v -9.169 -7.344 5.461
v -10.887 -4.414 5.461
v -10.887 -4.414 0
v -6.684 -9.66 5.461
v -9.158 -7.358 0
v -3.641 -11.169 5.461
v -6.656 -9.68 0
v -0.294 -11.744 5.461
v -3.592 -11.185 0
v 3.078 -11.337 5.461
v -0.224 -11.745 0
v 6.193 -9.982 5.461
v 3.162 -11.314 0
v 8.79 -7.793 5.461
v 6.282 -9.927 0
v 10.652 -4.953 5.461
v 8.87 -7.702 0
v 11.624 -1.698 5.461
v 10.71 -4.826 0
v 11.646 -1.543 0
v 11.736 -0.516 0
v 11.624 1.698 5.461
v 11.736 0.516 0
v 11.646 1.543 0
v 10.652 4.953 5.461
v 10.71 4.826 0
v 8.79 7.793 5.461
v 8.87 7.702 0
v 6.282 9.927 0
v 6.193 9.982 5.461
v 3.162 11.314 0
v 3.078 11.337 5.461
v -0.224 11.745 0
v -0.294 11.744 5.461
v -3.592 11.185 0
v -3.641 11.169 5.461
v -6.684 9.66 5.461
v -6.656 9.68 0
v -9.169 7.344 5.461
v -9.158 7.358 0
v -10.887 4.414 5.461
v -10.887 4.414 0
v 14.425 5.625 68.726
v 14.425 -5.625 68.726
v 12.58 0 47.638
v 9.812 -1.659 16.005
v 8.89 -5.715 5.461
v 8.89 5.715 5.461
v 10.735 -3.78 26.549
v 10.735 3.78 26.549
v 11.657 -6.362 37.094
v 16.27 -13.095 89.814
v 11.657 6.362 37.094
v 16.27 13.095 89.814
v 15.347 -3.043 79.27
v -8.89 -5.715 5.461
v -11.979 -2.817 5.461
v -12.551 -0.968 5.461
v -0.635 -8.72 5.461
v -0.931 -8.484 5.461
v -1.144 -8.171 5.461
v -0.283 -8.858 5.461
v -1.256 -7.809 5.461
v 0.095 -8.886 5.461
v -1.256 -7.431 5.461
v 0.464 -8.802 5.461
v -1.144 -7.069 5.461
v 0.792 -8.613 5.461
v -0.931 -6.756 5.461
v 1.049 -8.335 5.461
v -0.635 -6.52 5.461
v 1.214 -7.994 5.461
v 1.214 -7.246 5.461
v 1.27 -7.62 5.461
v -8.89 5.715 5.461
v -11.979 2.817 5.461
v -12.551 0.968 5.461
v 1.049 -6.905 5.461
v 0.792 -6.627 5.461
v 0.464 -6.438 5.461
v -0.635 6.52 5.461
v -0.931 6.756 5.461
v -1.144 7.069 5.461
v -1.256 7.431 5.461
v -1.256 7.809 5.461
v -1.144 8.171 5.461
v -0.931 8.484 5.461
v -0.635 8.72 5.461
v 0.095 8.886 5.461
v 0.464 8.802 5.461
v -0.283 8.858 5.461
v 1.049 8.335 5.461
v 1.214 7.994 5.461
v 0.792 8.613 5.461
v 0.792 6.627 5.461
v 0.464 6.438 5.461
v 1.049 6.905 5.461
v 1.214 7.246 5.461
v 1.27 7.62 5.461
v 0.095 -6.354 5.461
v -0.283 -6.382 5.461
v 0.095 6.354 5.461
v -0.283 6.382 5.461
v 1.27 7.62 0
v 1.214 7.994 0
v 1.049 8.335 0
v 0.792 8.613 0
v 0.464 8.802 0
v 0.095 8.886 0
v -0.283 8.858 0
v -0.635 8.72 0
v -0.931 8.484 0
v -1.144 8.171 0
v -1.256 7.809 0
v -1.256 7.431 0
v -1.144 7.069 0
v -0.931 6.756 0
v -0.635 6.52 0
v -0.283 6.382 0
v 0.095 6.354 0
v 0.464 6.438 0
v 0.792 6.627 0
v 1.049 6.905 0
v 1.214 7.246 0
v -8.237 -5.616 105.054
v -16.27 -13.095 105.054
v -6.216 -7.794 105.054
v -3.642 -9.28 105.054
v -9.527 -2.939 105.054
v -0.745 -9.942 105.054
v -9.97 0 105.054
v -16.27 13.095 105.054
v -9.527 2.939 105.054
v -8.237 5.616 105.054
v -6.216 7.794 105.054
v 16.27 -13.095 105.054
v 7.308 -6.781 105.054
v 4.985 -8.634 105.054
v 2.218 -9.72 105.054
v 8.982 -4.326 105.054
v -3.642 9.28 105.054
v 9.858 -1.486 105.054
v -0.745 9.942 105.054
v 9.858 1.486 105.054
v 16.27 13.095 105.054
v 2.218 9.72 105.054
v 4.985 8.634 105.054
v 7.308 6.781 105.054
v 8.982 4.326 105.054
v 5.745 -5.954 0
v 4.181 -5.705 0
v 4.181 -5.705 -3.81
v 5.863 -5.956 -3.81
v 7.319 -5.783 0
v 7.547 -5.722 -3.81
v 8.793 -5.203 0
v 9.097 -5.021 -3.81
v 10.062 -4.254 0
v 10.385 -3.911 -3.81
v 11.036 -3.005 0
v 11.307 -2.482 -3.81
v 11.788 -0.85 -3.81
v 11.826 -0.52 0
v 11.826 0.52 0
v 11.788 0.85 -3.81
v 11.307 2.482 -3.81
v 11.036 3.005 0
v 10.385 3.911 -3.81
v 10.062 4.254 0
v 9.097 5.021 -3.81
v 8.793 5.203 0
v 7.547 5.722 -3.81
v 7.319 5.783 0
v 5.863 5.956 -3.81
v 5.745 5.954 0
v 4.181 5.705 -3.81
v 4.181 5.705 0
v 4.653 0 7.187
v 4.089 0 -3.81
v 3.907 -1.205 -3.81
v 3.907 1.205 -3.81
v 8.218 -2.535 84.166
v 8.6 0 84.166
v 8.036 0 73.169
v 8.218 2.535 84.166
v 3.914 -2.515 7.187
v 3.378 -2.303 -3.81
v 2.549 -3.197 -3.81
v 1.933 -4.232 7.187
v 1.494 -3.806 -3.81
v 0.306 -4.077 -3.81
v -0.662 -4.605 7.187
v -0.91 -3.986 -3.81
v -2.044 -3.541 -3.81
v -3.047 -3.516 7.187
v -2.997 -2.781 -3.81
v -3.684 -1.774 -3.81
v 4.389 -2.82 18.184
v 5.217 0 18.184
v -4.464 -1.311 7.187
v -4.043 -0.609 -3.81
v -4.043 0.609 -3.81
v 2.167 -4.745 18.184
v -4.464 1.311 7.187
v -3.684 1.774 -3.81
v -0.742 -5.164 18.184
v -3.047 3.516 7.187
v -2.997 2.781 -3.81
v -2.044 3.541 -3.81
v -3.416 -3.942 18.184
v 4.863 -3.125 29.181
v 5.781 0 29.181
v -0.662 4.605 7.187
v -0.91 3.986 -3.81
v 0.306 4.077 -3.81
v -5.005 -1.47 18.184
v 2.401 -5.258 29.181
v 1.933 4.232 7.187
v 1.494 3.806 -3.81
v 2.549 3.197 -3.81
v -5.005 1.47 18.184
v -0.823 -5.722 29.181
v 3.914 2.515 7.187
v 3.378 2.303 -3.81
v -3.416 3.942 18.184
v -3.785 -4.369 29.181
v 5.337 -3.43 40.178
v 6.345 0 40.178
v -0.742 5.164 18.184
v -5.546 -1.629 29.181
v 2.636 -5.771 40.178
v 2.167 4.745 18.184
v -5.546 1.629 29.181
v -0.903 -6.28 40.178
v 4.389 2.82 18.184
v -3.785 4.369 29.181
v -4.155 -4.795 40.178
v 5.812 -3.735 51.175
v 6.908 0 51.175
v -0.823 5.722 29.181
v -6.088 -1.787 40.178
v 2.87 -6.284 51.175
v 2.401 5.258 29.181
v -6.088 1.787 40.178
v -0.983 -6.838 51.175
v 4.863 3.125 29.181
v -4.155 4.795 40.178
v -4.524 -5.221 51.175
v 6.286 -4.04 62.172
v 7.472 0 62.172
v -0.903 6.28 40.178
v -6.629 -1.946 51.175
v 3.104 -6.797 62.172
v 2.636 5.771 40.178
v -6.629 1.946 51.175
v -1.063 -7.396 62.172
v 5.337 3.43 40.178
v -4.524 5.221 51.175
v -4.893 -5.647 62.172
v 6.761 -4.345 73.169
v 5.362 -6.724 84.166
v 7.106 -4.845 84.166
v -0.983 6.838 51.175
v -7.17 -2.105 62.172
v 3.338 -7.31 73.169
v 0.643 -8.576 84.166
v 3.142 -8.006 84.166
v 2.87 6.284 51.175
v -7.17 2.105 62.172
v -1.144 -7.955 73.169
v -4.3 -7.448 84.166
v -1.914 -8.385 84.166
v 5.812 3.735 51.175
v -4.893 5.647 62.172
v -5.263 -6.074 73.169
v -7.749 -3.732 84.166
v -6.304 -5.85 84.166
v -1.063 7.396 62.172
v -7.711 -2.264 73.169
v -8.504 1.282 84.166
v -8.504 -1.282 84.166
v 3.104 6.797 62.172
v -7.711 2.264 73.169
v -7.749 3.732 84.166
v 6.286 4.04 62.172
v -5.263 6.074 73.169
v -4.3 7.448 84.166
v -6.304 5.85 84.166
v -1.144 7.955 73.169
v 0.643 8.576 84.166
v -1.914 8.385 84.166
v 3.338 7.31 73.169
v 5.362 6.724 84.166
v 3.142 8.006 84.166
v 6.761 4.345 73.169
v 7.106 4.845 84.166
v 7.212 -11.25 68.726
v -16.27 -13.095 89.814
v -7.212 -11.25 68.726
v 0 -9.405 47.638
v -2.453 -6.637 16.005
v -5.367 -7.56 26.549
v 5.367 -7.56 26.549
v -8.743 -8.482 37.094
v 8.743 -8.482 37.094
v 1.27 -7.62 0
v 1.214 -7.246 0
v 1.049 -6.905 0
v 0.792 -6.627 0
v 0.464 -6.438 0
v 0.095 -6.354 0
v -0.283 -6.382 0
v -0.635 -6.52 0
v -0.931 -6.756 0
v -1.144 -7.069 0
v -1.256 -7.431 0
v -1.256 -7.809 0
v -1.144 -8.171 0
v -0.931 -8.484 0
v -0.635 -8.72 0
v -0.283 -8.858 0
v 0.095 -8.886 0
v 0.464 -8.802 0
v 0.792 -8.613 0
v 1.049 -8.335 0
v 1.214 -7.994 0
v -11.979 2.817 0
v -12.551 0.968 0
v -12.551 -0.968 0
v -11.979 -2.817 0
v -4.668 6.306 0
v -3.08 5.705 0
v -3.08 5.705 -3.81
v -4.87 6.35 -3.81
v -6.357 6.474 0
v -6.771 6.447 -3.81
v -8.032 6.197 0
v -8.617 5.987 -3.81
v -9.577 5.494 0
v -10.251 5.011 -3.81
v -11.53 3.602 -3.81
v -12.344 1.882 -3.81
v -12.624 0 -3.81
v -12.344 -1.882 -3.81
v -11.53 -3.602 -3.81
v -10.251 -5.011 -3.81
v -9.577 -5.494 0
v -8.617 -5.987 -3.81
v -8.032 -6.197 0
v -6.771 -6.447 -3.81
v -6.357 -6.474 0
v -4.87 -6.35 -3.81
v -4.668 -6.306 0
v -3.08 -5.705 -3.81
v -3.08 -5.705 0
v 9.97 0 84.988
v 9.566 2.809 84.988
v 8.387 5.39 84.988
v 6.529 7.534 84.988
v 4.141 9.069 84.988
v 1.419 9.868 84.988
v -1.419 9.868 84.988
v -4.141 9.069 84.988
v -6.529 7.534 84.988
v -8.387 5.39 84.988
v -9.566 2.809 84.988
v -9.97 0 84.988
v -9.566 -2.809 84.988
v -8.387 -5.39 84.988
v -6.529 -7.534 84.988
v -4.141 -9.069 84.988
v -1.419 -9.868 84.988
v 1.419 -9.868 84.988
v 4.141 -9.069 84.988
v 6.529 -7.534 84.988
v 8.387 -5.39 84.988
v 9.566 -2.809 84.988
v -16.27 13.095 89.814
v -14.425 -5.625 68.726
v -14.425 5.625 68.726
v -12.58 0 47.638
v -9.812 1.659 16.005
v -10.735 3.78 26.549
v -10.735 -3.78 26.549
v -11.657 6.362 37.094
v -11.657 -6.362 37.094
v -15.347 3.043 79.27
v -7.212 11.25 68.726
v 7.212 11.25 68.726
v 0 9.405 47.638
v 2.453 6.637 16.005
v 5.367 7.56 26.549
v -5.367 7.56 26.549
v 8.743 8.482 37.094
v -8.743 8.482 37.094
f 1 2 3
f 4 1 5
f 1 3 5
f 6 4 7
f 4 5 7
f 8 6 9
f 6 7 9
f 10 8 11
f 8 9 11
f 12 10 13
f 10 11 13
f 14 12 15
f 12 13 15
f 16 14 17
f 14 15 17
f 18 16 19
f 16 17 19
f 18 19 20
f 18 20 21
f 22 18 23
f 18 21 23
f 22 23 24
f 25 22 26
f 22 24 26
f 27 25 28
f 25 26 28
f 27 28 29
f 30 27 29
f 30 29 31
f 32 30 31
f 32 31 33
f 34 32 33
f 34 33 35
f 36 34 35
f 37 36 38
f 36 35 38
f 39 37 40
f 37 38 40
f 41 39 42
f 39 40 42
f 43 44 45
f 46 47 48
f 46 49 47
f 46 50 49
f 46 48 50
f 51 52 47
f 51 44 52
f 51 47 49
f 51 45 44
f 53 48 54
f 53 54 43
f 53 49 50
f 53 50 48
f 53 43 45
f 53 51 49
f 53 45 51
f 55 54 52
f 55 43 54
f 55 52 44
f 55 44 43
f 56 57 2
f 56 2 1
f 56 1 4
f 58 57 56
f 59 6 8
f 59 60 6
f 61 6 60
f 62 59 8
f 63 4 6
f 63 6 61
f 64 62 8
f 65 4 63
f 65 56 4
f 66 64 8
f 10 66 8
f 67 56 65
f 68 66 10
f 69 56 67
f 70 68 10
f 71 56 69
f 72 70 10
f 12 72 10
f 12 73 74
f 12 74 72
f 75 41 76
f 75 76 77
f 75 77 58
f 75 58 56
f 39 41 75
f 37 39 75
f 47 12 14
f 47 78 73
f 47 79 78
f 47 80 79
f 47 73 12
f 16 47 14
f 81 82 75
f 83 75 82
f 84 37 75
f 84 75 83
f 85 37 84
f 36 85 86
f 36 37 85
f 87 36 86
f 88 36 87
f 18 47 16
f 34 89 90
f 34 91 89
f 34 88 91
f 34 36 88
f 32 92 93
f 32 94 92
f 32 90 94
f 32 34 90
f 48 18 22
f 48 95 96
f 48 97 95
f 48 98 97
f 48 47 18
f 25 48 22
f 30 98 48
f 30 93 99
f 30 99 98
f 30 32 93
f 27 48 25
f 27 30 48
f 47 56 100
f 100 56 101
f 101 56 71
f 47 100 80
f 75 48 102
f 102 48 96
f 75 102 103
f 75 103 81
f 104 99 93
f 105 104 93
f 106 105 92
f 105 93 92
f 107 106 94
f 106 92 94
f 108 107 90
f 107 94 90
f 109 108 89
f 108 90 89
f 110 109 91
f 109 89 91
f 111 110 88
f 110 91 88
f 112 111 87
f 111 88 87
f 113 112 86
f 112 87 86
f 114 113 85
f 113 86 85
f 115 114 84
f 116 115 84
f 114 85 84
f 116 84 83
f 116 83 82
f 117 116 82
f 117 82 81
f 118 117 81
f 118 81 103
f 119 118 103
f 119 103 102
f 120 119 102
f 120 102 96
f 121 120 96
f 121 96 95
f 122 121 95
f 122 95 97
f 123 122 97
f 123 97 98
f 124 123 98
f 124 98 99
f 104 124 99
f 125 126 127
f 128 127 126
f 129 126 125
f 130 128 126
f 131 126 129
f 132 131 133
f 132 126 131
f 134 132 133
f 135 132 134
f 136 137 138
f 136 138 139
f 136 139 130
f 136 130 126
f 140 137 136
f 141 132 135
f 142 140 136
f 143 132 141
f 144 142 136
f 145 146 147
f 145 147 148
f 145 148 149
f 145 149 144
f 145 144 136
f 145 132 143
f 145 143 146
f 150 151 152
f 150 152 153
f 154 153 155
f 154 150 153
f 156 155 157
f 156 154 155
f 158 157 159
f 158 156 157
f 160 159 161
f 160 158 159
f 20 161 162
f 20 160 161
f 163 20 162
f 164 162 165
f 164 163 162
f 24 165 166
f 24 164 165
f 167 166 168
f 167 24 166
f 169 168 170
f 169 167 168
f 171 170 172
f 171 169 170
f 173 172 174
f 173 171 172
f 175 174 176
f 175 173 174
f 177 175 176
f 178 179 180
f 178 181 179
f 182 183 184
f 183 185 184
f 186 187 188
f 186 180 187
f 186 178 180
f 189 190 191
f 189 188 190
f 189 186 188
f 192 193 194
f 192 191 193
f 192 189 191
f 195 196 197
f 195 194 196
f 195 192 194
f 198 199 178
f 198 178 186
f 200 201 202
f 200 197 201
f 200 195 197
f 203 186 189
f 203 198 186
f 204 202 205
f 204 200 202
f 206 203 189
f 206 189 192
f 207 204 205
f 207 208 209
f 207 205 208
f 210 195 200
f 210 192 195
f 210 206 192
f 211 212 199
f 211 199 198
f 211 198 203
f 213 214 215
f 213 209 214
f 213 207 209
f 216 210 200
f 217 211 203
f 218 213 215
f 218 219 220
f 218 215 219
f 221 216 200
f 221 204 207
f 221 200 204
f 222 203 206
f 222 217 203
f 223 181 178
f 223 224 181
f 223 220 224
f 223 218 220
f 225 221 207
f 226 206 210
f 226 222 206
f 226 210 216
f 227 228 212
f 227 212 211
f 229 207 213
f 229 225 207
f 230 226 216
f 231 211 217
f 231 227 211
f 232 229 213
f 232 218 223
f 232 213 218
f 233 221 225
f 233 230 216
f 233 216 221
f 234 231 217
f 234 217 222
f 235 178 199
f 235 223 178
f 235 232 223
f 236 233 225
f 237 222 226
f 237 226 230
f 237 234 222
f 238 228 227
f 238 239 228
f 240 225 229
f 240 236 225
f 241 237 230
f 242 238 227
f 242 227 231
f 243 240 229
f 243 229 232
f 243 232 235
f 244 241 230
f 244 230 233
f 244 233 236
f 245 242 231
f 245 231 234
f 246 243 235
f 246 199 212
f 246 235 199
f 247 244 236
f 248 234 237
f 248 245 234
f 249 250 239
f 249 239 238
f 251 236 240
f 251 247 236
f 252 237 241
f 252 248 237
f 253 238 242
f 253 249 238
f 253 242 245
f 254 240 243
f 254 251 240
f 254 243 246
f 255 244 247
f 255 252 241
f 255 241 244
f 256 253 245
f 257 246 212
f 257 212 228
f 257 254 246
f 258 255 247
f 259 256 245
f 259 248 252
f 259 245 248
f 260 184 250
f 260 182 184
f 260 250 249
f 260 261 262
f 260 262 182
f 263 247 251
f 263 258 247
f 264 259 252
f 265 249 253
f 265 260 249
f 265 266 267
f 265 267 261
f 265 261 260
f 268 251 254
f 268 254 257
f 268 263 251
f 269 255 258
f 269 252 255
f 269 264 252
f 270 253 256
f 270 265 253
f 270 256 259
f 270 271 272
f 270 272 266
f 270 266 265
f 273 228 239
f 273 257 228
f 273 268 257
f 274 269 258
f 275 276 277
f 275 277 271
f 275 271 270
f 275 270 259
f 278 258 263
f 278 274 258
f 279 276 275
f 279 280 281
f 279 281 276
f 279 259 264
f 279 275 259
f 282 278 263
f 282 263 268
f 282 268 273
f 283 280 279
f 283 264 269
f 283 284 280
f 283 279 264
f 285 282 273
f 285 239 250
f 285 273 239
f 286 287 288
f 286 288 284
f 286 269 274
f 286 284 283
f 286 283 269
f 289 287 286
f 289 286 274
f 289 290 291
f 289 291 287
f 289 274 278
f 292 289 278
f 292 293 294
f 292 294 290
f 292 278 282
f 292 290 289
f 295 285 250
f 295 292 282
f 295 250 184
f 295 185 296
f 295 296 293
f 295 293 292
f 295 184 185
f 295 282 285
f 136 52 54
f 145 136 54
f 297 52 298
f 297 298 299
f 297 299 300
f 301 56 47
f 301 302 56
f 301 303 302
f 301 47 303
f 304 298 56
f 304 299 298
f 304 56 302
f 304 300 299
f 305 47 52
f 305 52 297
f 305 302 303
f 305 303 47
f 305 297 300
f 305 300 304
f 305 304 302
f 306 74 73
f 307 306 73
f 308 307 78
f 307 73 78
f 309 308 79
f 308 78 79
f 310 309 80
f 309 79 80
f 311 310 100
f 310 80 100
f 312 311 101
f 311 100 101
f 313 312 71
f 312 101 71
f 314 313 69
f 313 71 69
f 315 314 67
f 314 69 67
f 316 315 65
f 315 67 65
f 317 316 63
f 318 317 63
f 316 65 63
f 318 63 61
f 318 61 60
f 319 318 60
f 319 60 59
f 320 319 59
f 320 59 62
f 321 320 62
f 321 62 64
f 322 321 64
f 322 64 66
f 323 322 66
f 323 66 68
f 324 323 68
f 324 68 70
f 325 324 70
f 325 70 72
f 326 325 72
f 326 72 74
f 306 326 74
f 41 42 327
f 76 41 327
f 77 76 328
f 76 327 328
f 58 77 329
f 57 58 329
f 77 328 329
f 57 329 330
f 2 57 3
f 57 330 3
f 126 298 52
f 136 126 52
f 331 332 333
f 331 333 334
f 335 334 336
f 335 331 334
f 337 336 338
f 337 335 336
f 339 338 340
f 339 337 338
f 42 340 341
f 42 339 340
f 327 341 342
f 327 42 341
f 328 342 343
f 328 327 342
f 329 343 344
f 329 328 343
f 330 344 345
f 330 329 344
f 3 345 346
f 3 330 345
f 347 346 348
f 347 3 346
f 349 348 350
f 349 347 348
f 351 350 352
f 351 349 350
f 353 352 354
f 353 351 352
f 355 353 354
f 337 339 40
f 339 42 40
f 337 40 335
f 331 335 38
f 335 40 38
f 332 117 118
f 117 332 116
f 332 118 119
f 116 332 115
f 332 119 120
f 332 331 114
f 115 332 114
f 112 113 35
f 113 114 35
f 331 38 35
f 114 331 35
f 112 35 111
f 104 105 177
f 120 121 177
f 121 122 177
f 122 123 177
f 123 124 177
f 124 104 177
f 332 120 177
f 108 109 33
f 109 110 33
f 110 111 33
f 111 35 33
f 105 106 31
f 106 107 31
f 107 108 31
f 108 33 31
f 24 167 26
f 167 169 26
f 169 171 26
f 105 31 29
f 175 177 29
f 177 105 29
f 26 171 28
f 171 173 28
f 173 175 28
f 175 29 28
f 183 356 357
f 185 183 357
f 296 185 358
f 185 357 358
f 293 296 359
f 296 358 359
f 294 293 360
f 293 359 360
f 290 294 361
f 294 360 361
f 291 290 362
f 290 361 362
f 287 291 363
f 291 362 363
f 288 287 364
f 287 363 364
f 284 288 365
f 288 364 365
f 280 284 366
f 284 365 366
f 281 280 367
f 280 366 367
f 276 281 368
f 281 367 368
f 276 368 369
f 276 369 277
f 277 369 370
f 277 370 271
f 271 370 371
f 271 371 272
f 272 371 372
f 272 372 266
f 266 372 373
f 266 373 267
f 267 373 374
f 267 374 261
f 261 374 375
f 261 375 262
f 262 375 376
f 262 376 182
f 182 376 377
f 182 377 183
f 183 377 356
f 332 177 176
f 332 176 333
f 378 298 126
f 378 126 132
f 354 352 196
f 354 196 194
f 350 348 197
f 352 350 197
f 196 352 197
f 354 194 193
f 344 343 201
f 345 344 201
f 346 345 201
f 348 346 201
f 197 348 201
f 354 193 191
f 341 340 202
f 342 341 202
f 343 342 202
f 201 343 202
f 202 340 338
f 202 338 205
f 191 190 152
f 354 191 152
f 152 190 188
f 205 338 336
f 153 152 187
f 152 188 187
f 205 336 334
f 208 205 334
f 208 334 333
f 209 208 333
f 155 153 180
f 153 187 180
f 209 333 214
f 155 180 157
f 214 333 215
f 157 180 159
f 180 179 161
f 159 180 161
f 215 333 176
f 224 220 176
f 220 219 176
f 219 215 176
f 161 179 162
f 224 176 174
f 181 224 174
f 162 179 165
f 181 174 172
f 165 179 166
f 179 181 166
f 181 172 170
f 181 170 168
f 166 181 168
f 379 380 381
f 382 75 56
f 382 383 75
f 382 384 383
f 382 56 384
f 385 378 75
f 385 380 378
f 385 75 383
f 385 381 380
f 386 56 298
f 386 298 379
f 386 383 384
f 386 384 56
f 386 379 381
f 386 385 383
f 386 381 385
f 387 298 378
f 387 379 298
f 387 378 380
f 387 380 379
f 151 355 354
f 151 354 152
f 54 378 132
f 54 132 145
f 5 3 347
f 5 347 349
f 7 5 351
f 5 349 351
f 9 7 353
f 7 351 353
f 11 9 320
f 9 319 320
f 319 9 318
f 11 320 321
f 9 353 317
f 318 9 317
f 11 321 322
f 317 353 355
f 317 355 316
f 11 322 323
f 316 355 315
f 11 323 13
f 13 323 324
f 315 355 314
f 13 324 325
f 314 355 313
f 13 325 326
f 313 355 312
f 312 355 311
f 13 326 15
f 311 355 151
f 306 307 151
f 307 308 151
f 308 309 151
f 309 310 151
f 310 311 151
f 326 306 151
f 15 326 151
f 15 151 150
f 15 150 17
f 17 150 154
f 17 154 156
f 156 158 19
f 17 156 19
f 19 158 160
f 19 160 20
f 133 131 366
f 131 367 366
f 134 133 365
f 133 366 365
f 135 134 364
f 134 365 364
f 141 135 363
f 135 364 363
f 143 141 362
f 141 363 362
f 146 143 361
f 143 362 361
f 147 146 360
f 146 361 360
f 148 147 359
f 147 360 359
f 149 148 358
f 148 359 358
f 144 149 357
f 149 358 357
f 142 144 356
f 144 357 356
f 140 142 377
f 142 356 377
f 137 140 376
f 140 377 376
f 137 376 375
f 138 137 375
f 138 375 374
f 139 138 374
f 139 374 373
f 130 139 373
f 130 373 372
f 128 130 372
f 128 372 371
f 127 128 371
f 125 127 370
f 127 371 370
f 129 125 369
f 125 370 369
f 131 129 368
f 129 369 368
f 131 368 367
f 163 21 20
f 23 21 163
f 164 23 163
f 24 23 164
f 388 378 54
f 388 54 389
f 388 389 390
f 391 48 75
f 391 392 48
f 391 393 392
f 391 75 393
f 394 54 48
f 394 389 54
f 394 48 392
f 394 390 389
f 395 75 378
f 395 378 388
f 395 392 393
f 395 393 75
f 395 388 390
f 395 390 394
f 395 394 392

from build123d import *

# Parameters (mm, degrees)
F1_DEPTH  = 3.81
F3_DEPTH  = 5.461
F5_R      = 1.27
F6_DEPTH  = 9.272
F7_W      = 17.78
F7_H      = 11.43
F8_DEPTH  = 84.3534
F8_TAPER  = -5
F9_R      = 4.088765
F10_DEPTH = 93.6254001
F10_TAPER = -2.9356734464
F11_W     = 32.5399324597
F11_H     = 26.1899324597
F12_DEPTH = 15.24
F14_D     = 19.939
F14_DEPTH = 20.066
F14_TIP   = 5.9902799414


with BuildPart() as f1:
    # F0 (on Top) → F1 (new body)
    with BuildSketch(Plane.XY):
        with BuildLine():
            Line((4.1806183802, 5.7049052394), (-3.0799473447, 5.7049052394))
            ThreePointArc((-3.0799473447, 5.7049052394), (-12.6238, 0), (-3.0799473447, -5.7049052394))
            Line((-3.0799473447, -5.7049052394), (4.1806183802, -5.7049052394))
            ThreePointArc((4.1806183802, -5.7049052394), (11.8491, 0), (4.1806183802, 5.7049052394))
        make_face()
    extrude(amount=-F1_DEPTH)

    # F2 (on Top) → F3 (join)
    with BuildSketch(Plane.XY):
        with BuildLine():
            ThreePointArc((-10.8865895661, 4.4142863374), (-12.6238, 0), (-10.8865895661, -4.4142863374))
            ThreePointArc((-10.8865895661, -4.4142863374), (11.7475, 0), (-10.8865895661, 4.4142863374))
        make_face()
    extrude(amount=F3_DEPTH)

    # F5 (on face) → F6 (cut, through all)
    with BuildSketch(Plane.XY.offset(5.461)):
        with Locations((0, -7.62)):
            Circle(F5_R)
        with Locations((0, 7.62)):
            Circle(F5_R)
    extrude(amount=-F6_DEPTH, mode=Mode.SUBTRACT)

    # F7 (on face) → F8 (join)
    with BuildSketch(Plane.XY.offset(5.461)):
        Rectangle(F7_W, F7_H)
    extrude(amount=F8_DEPTH, taper=F8_TAPER)

    # F9 (on face) → F10 (cut, through all)
    with BuildSketch(Plane(origin=(0, 0, -3.81), x_dir=(1, 0, 0), z_dir=(0, 0, -1))):
        Circle(F9_R)
    extrude(amount=-F10_DEPTH, taper=F10_TAPER, mode=Mode.SUBTRACT)

    # F11 (on face) → F12 (join)
    with BuildSketch(Plane.XY.offset(89.8144)):
        Rectangle(F11_W, F11_H)
    extrude(amount=F12_DEPTH)

    # F14
    with Locations(Plane.XY.offset(105.0544)):
        with Locations((0, 0)):
            Hole(F14_D / 2, depth=F14_DEPTH)
            with Locations((0, 0, -(F14_DEPTH + F14_TIP / 2))):  # 118° drill point
                Cone(0, F14_D / 2, F14_TIP, mode=Mode.SUBTRACT)


solid = f1.part
